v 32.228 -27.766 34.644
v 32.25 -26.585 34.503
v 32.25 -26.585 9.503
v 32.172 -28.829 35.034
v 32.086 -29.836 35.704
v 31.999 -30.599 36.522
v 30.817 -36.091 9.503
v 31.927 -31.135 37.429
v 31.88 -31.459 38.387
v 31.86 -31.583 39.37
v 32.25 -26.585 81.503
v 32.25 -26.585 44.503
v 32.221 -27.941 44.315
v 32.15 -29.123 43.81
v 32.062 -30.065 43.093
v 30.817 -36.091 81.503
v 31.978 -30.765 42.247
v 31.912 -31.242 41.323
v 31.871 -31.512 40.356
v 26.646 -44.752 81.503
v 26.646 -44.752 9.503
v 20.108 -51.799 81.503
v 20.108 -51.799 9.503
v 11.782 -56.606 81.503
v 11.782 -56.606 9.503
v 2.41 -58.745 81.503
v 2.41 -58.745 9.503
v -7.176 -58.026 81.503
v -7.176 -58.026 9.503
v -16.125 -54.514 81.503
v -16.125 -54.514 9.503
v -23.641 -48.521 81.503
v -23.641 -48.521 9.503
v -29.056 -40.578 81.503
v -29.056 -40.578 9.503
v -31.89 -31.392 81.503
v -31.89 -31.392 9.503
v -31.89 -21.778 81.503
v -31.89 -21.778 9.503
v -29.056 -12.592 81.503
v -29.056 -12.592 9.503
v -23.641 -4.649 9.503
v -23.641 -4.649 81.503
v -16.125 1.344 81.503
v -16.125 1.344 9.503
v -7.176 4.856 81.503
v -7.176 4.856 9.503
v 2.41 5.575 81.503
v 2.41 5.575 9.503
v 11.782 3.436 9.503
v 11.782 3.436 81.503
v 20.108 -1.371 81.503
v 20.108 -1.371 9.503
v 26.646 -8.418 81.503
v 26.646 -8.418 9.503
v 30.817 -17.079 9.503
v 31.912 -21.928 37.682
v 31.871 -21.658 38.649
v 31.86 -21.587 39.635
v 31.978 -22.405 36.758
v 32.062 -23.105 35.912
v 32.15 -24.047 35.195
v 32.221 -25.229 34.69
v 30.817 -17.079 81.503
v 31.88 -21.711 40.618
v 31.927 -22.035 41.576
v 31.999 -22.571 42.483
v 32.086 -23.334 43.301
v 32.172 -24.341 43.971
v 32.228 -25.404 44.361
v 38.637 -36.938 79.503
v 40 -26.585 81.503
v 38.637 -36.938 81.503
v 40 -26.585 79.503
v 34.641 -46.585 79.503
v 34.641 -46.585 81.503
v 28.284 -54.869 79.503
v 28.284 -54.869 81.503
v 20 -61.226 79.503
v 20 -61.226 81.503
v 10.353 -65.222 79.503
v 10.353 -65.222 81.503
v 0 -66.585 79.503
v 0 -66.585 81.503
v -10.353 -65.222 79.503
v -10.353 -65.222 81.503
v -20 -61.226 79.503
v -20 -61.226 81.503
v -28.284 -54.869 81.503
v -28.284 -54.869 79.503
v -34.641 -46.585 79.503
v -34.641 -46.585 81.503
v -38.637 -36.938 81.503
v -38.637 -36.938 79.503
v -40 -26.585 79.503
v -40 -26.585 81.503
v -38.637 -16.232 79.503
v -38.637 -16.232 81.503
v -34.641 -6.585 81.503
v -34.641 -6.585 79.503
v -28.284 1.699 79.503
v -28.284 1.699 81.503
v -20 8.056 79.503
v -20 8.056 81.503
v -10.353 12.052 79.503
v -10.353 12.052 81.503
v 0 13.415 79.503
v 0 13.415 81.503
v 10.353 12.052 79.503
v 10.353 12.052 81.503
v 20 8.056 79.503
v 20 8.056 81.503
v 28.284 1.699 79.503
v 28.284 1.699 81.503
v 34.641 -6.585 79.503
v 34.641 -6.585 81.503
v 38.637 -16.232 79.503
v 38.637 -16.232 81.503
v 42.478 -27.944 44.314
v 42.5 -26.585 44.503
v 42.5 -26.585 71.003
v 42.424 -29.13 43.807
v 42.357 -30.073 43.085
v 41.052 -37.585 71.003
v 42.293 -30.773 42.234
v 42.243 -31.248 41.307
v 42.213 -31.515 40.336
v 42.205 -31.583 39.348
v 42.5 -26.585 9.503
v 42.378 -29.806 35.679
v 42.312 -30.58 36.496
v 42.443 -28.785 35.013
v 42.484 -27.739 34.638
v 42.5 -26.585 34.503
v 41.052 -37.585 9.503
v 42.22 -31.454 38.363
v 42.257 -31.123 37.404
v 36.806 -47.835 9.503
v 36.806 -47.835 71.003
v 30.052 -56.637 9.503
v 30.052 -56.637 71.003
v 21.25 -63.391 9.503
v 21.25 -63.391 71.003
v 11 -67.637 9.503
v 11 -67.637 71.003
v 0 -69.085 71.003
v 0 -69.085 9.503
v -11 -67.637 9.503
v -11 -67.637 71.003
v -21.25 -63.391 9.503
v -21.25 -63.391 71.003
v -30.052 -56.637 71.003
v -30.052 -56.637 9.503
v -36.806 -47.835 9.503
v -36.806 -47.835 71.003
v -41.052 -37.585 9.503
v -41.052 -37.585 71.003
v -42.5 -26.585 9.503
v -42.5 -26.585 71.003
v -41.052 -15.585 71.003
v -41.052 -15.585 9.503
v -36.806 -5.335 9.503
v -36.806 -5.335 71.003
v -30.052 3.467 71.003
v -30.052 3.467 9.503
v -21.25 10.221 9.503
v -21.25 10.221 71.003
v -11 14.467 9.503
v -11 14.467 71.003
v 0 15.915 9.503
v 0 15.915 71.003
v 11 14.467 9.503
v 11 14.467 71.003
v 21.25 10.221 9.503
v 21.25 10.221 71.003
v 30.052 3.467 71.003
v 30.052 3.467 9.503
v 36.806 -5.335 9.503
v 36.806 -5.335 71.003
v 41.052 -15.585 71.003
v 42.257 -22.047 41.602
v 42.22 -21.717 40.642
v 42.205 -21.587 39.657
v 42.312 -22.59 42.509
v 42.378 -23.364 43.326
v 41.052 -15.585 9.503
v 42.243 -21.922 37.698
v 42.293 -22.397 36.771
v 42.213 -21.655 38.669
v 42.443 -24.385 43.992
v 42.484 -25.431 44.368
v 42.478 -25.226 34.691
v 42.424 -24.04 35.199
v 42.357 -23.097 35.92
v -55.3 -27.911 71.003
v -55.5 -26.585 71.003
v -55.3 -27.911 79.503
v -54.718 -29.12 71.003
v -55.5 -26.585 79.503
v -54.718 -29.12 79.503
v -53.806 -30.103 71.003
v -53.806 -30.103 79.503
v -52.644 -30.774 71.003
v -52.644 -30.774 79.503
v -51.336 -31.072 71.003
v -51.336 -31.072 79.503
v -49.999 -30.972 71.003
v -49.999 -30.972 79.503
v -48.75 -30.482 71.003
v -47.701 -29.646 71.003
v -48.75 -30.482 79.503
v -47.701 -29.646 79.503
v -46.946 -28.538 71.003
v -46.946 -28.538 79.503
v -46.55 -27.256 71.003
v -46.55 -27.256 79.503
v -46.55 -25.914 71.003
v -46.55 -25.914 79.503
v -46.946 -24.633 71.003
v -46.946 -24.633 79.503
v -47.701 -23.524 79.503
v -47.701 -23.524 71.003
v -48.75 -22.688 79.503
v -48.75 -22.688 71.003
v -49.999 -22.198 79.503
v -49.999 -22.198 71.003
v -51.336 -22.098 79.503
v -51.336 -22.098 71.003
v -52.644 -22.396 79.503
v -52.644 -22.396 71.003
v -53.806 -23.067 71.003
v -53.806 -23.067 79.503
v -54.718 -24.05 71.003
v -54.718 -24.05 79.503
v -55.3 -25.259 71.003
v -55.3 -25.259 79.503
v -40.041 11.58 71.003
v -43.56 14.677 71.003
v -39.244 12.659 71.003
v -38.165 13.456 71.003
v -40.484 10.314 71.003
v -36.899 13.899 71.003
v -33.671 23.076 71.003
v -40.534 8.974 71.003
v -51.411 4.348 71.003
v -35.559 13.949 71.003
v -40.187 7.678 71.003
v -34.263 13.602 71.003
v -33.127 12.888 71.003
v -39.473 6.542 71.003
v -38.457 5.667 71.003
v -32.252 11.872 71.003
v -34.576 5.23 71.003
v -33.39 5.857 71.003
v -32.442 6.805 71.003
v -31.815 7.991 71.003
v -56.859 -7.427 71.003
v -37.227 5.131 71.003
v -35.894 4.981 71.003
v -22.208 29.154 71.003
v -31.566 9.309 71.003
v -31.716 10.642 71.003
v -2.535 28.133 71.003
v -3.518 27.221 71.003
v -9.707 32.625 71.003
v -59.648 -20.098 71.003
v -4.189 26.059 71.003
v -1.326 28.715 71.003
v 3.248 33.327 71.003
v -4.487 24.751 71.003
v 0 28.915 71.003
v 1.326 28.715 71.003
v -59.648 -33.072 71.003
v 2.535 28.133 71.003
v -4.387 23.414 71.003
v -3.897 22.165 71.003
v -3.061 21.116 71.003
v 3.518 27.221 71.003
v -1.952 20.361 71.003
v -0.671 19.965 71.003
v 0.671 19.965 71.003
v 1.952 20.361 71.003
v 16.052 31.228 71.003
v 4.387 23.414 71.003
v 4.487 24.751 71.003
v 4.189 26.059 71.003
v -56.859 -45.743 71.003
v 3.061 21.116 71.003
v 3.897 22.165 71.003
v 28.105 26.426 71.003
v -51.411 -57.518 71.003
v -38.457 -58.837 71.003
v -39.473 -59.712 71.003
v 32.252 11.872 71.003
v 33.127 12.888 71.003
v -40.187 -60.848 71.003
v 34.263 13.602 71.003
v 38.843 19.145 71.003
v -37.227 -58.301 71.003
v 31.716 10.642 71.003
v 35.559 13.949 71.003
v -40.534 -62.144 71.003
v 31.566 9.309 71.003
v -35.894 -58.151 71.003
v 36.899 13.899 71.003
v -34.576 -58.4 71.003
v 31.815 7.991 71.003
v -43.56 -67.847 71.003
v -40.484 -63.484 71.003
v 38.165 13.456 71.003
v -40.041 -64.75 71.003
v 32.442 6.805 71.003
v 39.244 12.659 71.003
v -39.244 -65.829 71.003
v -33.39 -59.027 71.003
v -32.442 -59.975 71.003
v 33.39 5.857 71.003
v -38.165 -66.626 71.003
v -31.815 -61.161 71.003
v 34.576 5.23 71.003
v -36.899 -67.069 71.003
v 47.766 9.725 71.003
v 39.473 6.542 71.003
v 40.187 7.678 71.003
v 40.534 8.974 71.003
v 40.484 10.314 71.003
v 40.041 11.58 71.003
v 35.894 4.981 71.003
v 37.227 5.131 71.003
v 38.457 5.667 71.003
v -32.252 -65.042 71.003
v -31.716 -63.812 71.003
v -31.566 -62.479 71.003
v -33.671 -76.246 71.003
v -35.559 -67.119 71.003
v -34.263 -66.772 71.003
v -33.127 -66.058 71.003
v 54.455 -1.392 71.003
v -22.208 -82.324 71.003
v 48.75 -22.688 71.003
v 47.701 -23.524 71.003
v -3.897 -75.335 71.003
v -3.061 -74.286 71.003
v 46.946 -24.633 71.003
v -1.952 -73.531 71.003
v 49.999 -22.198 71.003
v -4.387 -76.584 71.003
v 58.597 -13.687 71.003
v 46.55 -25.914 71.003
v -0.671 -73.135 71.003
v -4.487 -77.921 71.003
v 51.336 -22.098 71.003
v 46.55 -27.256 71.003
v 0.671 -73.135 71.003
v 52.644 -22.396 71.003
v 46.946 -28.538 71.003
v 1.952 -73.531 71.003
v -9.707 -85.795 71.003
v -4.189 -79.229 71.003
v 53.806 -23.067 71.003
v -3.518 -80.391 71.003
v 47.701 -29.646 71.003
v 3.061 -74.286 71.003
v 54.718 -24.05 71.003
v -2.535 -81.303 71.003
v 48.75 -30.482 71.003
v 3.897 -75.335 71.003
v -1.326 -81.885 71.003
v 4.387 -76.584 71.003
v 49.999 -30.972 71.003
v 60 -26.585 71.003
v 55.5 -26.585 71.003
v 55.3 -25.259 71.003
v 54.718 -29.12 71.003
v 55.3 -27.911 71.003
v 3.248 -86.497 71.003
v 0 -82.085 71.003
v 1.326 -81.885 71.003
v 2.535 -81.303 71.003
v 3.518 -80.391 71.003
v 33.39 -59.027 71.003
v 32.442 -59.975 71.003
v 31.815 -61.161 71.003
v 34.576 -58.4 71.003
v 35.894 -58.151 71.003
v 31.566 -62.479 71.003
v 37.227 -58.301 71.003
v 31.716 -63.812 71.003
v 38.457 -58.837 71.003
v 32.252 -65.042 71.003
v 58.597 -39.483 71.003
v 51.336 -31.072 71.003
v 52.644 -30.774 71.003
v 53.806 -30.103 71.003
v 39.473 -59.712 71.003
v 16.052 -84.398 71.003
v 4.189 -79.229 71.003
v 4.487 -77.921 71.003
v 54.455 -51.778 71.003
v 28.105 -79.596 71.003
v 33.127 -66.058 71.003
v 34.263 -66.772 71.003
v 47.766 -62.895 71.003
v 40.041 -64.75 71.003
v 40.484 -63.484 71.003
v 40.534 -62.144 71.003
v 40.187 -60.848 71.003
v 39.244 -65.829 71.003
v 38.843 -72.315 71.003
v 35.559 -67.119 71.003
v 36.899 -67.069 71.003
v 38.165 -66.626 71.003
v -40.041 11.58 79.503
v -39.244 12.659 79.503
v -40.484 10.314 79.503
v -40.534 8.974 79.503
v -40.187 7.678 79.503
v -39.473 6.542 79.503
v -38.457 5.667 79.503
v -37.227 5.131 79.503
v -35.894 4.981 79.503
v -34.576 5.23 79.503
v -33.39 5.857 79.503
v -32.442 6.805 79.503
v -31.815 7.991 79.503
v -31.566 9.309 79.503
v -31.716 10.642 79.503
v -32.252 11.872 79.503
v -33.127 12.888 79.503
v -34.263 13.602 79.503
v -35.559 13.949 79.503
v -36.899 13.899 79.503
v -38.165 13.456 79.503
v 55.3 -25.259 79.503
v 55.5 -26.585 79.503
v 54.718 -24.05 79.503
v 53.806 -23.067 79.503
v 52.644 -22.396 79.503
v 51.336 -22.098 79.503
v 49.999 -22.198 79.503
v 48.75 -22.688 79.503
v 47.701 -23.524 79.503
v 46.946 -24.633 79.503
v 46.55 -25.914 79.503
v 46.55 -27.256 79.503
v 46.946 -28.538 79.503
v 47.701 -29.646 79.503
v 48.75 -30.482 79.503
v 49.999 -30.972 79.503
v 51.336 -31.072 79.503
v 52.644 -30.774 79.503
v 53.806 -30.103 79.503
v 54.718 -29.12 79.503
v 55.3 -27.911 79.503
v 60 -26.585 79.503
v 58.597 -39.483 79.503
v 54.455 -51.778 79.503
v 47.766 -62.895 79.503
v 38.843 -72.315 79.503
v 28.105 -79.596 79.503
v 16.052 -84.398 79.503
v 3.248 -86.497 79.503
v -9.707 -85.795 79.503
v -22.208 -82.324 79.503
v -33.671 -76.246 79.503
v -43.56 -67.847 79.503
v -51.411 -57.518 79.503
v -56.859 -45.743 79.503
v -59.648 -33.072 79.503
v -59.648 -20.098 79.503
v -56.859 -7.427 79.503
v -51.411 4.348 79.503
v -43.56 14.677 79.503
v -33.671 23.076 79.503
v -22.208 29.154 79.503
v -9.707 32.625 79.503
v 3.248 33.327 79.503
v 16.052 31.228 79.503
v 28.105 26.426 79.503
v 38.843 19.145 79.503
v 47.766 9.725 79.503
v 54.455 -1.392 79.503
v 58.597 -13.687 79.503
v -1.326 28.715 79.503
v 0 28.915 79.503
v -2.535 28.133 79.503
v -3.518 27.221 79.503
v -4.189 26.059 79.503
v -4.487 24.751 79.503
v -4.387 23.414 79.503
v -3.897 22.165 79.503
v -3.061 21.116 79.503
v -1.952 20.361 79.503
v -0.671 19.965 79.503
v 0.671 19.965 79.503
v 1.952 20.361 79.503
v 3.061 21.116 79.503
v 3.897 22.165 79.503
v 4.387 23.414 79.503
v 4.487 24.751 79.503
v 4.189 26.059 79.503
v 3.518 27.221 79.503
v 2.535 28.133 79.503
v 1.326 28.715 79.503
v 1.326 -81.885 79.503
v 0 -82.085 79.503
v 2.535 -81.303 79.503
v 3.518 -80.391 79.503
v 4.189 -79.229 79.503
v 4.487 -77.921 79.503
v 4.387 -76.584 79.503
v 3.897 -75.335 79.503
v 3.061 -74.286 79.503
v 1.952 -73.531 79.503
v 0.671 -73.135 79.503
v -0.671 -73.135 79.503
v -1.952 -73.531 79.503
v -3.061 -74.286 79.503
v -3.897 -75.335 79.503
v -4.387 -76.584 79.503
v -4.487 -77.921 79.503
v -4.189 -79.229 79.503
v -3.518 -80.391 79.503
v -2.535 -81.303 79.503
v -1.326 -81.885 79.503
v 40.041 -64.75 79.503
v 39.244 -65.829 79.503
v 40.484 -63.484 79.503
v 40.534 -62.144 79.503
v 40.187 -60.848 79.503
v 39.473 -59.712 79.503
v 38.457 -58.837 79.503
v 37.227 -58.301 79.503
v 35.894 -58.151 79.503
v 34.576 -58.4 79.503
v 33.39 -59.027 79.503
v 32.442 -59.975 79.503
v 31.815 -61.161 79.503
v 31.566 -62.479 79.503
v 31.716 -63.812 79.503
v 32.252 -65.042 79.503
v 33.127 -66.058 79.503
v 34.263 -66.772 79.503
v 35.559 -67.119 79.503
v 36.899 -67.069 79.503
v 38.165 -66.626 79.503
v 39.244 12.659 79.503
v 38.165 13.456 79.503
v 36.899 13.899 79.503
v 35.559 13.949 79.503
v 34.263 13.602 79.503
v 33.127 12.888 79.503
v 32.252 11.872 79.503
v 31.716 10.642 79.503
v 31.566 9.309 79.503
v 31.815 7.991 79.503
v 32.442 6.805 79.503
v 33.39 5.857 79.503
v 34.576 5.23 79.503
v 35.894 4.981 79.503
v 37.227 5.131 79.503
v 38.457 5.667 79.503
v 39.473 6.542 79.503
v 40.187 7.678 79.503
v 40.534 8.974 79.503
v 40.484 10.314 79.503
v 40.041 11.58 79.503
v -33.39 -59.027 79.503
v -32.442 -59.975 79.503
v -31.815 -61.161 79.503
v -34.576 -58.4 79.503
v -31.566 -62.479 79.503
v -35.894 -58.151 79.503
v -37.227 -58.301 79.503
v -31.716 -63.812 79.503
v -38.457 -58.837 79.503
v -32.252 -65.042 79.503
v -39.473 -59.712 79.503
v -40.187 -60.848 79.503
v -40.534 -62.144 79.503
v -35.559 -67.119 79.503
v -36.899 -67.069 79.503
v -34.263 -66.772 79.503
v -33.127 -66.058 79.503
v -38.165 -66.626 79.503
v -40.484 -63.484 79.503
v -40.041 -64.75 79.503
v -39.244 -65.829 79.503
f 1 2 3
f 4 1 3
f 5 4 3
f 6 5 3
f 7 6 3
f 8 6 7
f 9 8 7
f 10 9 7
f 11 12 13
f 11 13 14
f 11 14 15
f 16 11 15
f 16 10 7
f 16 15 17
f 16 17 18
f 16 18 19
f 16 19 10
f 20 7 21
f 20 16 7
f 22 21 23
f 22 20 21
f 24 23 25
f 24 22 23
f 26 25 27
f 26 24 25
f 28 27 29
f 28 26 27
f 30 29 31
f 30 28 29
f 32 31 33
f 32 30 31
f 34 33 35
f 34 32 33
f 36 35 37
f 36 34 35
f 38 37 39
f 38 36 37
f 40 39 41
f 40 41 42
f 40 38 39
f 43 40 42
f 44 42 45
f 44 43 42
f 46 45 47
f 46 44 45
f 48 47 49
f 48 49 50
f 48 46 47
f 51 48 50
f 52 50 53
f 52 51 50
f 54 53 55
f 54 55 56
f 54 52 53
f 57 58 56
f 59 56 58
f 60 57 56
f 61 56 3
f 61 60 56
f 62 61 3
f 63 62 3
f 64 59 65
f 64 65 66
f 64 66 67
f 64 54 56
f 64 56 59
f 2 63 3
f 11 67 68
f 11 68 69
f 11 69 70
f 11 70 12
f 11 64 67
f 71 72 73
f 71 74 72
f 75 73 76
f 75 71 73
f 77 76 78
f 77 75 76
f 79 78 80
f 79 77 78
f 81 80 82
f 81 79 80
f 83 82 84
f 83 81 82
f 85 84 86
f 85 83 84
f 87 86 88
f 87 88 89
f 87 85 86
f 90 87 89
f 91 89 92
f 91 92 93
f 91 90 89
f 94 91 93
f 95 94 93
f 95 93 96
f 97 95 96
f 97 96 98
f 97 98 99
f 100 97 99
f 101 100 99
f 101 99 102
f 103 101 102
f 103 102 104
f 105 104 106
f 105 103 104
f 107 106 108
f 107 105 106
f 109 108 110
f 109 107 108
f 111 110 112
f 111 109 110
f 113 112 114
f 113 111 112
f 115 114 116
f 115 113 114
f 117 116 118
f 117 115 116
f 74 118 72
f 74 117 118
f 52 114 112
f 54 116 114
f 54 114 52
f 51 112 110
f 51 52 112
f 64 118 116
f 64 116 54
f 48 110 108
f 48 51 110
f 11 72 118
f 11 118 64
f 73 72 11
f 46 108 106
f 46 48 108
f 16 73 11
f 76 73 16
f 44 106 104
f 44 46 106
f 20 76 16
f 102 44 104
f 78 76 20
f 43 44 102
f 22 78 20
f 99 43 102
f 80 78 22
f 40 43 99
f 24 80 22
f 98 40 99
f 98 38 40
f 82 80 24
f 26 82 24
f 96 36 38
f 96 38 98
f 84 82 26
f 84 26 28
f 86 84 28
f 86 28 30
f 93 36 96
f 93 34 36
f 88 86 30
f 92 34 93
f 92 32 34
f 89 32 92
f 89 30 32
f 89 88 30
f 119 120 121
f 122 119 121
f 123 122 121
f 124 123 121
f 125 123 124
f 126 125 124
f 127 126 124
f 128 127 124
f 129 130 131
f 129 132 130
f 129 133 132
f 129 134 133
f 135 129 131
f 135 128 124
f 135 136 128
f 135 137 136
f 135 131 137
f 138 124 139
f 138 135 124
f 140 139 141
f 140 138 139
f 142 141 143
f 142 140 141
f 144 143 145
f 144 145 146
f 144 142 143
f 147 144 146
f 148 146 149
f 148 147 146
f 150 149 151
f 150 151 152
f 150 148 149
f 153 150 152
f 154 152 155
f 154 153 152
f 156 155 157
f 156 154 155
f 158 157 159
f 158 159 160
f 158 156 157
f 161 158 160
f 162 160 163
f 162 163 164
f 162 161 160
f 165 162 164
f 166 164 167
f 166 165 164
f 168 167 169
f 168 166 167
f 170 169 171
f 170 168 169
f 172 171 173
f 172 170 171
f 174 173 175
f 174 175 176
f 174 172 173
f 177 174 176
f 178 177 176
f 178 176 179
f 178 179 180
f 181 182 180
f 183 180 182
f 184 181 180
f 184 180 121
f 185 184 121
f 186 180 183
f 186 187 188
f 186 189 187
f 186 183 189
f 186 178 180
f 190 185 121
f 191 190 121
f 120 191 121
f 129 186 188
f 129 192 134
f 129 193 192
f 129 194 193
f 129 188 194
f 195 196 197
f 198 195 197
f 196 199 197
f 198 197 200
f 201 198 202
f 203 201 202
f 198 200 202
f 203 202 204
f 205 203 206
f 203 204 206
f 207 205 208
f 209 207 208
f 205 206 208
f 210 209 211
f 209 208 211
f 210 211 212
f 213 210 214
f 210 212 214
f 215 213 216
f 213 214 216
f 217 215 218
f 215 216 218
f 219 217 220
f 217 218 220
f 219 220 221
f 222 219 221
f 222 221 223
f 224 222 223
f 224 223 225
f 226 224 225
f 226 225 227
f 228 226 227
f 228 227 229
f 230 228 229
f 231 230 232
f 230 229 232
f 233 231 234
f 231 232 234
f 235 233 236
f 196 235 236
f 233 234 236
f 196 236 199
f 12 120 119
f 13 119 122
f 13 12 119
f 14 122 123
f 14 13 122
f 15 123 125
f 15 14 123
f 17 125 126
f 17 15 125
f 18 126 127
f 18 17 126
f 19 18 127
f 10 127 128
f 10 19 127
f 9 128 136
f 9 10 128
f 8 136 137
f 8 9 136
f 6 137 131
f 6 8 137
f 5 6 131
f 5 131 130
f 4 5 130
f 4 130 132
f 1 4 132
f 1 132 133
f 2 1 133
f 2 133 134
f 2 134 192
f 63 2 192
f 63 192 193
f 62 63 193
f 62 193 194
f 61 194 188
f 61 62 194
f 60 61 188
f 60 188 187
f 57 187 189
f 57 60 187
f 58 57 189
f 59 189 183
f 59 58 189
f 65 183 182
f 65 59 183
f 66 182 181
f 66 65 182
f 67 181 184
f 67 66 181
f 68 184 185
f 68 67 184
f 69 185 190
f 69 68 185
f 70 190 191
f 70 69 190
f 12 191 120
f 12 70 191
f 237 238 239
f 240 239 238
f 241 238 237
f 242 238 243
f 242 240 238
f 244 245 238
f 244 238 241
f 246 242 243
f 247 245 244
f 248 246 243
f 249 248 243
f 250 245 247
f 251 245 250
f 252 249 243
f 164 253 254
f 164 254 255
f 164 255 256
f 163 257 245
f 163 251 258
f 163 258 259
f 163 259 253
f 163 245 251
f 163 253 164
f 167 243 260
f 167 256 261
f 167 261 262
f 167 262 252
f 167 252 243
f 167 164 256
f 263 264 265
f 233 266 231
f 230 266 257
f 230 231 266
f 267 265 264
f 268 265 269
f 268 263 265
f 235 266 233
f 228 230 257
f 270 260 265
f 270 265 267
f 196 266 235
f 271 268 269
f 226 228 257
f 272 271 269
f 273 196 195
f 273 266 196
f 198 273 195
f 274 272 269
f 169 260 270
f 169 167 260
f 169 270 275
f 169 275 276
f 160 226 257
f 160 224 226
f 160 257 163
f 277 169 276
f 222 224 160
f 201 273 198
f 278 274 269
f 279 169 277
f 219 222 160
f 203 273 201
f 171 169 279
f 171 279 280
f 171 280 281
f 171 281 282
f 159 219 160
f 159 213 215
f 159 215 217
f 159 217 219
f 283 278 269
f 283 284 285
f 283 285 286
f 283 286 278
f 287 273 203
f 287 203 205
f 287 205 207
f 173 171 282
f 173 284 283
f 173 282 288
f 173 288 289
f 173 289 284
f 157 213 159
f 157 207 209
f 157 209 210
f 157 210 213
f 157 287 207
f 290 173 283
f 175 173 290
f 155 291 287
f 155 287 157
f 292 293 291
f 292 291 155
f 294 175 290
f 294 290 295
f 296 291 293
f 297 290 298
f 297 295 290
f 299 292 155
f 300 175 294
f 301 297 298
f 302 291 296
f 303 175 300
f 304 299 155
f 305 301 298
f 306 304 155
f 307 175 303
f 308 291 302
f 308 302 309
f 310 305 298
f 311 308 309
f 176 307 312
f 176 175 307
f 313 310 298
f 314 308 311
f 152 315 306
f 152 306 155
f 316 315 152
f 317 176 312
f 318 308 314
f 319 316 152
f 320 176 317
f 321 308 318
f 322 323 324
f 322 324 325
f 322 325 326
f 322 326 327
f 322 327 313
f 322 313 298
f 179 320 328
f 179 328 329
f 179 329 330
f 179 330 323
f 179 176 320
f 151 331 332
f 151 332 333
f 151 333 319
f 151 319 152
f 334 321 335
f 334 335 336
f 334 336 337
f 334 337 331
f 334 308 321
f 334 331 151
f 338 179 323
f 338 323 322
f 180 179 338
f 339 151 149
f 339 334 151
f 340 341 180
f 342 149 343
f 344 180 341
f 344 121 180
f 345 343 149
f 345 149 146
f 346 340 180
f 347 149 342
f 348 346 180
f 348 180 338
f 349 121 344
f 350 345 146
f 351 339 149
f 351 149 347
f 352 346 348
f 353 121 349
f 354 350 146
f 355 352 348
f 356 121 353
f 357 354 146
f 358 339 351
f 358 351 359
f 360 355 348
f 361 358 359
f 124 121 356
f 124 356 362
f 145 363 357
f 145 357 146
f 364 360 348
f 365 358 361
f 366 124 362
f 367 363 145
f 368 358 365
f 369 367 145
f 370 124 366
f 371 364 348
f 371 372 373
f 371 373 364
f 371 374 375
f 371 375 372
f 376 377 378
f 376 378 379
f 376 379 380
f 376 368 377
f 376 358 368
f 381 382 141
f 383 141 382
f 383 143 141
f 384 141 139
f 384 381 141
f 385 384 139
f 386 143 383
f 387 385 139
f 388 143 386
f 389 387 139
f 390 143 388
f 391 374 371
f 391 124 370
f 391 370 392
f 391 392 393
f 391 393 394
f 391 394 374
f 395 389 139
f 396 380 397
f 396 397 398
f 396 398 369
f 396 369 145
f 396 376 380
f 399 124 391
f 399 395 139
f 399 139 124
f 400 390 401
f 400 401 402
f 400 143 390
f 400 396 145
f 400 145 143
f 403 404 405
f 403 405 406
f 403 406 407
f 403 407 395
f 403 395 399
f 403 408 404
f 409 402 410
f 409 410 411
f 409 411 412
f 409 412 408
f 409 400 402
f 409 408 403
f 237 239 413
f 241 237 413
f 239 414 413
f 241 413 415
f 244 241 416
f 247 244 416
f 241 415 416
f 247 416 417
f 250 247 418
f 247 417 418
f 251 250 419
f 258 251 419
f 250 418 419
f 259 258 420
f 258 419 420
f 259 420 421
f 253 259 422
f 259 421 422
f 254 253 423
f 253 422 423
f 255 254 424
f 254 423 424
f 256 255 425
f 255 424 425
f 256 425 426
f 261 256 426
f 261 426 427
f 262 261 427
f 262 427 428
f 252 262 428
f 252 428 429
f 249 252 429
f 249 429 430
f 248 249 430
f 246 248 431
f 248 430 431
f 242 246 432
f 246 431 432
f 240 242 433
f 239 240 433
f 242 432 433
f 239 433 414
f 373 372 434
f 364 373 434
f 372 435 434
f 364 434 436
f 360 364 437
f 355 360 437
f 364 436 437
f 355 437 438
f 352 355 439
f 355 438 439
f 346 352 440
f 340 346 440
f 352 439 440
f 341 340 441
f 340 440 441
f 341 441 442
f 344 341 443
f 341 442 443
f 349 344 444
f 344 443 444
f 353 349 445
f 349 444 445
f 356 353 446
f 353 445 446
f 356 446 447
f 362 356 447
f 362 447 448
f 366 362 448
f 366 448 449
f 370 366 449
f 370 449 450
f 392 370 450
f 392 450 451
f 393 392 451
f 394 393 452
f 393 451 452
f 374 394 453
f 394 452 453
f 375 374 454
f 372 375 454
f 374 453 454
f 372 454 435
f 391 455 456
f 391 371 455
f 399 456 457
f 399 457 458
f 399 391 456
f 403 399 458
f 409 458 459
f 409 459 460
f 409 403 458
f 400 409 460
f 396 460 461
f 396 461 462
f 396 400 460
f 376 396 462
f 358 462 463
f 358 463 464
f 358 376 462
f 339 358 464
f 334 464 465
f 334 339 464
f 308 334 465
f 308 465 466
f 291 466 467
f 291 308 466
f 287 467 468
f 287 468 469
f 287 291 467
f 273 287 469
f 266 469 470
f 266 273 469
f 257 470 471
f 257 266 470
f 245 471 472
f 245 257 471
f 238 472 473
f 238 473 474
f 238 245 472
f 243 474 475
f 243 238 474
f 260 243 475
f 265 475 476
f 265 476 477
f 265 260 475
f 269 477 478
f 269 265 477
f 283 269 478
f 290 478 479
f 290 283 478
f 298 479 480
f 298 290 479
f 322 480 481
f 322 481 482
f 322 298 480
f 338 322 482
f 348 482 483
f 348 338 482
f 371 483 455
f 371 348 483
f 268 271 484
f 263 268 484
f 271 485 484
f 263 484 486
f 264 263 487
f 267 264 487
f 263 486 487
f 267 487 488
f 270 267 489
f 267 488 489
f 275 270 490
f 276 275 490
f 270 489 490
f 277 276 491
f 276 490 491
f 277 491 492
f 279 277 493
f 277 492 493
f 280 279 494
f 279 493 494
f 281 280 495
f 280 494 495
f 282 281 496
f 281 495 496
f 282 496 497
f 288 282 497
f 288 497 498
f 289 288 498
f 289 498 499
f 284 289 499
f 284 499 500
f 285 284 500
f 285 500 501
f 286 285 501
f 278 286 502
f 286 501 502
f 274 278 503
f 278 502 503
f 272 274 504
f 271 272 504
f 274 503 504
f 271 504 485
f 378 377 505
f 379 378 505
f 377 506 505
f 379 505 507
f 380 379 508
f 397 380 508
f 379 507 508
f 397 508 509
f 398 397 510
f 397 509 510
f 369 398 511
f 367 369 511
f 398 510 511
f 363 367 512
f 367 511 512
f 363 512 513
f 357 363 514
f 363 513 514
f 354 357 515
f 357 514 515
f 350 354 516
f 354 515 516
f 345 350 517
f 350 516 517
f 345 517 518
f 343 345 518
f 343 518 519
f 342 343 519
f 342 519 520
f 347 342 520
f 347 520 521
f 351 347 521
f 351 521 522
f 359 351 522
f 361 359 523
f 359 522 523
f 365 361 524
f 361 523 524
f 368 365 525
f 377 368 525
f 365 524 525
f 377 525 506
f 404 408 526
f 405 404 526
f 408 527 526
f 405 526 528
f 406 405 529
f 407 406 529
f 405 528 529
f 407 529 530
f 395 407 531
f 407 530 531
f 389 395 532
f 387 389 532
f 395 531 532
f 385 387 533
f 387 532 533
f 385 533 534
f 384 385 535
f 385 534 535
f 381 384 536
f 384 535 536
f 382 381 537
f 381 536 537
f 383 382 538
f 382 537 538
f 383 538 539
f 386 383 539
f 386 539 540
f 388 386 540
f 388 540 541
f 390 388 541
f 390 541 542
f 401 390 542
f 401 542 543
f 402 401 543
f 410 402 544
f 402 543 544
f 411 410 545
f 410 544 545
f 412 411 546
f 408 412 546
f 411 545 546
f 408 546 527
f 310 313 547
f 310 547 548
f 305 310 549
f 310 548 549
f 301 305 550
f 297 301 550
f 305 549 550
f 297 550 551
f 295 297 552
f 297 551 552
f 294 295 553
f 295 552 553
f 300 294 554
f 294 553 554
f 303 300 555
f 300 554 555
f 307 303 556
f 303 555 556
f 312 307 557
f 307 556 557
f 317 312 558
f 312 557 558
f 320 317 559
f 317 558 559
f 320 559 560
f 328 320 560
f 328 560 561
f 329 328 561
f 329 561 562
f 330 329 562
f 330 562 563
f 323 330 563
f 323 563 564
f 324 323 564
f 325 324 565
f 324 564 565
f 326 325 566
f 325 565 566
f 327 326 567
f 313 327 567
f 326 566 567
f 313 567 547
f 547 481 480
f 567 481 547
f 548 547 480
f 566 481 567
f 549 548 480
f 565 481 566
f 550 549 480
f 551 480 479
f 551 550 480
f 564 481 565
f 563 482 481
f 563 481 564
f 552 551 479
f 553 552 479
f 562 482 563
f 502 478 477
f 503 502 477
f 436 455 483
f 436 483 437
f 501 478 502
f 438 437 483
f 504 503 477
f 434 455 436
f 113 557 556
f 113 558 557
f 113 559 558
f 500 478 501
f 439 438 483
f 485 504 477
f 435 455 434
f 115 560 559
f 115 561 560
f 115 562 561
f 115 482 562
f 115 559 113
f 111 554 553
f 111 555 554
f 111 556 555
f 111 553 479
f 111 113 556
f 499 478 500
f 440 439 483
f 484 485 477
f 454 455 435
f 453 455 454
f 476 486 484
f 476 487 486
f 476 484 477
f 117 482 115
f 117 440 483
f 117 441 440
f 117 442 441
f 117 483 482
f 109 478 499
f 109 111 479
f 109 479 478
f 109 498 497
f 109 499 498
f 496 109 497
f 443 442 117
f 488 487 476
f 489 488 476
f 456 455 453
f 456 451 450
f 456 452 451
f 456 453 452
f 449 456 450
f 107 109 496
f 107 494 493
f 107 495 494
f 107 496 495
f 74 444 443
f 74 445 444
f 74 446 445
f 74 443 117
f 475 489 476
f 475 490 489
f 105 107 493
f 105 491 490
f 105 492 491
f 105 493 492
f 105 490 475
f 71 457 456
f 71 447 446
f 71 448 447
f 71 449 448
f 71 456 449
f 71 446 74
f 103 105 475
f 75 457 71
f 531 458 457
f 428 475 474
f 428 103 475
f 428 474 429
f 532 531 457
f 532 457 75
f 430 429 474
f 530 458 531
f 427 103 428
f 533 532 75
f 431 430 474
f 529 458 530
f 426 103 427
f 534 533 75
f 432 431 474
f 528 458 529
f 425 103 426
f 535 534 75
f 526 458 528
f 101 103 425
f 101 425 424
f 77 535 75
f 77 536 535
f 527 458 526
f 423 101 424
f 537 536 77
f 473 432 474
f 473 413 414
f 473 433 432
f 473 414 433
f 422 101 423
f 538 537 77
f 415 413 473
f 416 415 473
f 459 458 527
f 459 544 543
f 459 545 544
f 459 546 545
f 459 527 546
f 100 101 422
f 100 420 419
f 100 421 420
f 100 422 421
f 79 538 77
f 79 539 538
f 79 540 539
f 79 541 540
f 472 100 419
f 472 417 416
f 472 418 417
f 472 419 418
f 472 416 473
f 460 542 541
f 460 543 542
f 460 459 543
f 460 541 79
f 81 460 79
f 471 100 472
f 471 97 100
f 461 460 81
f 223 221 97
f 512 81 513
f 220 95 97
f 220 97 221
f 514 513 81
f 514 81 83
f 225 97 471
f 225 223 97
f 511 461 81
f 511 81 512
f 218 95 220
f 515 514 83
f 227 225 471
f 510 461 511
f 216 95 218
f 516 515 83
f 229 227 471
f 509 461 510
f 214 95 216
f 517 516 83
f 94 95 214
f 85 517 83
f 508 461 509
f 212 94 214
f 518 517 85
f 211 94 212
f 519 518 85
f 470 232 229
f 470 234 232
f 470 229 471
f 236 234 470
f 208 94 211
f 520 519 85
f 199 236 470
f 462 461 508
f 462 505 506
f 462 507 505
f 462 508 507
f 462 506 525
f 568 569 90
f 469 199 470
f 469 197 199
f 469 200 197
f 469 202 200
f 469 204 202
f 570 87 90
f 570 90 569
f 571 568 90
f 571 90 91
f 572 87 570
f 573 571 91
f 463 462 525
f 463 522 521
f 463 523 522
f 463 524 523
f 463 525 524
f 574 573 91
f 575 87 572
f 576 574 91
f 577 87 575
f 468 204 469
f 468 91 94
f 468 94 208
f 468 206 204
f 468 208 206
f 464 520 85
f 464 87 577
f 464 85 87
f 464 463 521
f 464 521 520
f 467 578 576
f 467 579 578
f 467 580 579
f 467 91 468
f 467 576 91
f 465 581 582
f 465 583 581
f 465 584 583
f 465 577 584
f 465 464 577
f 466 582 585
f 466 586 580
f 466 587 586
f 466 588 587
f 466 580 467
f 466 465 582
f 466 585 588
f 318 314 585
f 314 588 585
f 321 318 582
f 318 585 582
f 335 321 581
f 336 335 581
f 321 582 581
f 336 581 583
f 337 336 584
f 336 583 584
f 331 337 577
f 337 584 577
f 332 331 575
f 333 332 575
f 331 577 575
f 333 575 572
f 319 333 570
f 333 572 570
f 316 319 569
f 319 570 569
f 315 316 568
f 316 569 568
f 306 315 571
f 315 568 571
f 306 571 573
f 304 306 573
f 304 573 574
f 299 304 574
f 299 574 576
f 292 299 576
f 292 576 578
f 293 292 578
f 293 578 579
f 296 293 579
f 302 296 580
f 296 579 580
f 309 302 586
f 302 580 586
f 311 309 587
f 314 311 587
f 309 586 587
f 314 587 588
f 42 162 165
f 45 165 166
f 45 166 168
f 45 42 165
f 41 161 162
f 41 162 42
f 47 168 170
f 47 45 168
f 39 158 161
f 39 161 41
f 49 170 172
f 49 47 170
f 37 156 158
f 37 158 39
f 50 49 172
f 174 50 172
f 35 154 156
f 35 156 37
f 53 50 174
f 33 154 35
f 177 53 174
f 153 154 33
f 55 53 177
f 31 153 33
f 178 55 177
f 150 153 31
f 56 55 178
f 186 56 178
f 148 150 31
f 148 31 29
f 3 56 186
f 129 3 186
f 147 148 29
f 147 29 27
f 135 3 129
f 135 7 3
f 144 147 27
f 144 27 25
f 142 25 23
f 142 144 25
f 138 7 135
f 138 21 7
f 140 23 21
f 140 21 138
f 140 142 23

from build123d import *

# Parameters (mm, degrees)
SKETCH2_R          = 4.5
CUT_EXTRUDE1_DEPTH = 127.479115352
CIRPATTERN1_COUNT  = 8
SKETCH3_R          = 5
CUT_EXTRUDE2_DEPTH = 70


with BuildPart() as part:
    # Sketch1 → Revolve1 (revolve)
    with BuildSketch(Plane(origin=(0, 0, 0), x_dir=(0, 0, -1), z_dir=(1, 0, 0)), mode=Mode.PRIVATE) as revolve1_sk:
        Polygon((-9.502538071, 5.664974619), (-81.502538071, 5.664974619), (-81.502538071, 13.414974619), (-79.502538071, 13.414974619), (-79.502538071, 33.414974619), (-71.002538071, 33.414974619), (-71.002538071, 15.914974619), (-9.502538071, 15.914974619), align=None)
    revolve(revolve1_sk.sketch.rotate(Axis((0, -26.585025381, 81.502538071), (0, 0, -1)), 90), axis=Axis((0, -26.585025381, 81.502538071), (0, 0, -1)))

    # Sketch2 → Cut-Extrude1 (cut, symmetric)
    with BuildSketch(Plane.XY.offset(79.502538071)):
        with Locations((51, -26.585025381)):
            Circle(SKETCH2_R)
    cut_extrude1 = extrude(amount=CUT_EXTRUDE1_DEPTH, both=True, mode=Mode.SUBTRACT)

    # CirPattern1: Cut-Extrude1 ×8 about axis
    cirpattern1_axis = Axis((0, -26.585025381, 0), (0, 0, 1))
    for i in range(1, CIRPATTERN1_COUNT):
        add(cut_extrude1.rotate(cirpattern1_axis, i * 360 / CIRPATTERN1_COUNT), mode=Mode.SUBTRACT)

    # Sketch3 → Cut-Extrude2 (cut)
    with BuildSketch(Plane(origin=(0, 0, 0), x_dir=(0, 0, -1), z_dir=(1, 0, 0))):
        with Locations(Location((-39.502538071, -26.585025381, 0), (0, 0, 180))):
            Circle(SKETCH3_R)
    extrude(amount=CUT_EXTRUDE2_DEPTH, mode=Mode.SUBTRACT)


solid = part.part
